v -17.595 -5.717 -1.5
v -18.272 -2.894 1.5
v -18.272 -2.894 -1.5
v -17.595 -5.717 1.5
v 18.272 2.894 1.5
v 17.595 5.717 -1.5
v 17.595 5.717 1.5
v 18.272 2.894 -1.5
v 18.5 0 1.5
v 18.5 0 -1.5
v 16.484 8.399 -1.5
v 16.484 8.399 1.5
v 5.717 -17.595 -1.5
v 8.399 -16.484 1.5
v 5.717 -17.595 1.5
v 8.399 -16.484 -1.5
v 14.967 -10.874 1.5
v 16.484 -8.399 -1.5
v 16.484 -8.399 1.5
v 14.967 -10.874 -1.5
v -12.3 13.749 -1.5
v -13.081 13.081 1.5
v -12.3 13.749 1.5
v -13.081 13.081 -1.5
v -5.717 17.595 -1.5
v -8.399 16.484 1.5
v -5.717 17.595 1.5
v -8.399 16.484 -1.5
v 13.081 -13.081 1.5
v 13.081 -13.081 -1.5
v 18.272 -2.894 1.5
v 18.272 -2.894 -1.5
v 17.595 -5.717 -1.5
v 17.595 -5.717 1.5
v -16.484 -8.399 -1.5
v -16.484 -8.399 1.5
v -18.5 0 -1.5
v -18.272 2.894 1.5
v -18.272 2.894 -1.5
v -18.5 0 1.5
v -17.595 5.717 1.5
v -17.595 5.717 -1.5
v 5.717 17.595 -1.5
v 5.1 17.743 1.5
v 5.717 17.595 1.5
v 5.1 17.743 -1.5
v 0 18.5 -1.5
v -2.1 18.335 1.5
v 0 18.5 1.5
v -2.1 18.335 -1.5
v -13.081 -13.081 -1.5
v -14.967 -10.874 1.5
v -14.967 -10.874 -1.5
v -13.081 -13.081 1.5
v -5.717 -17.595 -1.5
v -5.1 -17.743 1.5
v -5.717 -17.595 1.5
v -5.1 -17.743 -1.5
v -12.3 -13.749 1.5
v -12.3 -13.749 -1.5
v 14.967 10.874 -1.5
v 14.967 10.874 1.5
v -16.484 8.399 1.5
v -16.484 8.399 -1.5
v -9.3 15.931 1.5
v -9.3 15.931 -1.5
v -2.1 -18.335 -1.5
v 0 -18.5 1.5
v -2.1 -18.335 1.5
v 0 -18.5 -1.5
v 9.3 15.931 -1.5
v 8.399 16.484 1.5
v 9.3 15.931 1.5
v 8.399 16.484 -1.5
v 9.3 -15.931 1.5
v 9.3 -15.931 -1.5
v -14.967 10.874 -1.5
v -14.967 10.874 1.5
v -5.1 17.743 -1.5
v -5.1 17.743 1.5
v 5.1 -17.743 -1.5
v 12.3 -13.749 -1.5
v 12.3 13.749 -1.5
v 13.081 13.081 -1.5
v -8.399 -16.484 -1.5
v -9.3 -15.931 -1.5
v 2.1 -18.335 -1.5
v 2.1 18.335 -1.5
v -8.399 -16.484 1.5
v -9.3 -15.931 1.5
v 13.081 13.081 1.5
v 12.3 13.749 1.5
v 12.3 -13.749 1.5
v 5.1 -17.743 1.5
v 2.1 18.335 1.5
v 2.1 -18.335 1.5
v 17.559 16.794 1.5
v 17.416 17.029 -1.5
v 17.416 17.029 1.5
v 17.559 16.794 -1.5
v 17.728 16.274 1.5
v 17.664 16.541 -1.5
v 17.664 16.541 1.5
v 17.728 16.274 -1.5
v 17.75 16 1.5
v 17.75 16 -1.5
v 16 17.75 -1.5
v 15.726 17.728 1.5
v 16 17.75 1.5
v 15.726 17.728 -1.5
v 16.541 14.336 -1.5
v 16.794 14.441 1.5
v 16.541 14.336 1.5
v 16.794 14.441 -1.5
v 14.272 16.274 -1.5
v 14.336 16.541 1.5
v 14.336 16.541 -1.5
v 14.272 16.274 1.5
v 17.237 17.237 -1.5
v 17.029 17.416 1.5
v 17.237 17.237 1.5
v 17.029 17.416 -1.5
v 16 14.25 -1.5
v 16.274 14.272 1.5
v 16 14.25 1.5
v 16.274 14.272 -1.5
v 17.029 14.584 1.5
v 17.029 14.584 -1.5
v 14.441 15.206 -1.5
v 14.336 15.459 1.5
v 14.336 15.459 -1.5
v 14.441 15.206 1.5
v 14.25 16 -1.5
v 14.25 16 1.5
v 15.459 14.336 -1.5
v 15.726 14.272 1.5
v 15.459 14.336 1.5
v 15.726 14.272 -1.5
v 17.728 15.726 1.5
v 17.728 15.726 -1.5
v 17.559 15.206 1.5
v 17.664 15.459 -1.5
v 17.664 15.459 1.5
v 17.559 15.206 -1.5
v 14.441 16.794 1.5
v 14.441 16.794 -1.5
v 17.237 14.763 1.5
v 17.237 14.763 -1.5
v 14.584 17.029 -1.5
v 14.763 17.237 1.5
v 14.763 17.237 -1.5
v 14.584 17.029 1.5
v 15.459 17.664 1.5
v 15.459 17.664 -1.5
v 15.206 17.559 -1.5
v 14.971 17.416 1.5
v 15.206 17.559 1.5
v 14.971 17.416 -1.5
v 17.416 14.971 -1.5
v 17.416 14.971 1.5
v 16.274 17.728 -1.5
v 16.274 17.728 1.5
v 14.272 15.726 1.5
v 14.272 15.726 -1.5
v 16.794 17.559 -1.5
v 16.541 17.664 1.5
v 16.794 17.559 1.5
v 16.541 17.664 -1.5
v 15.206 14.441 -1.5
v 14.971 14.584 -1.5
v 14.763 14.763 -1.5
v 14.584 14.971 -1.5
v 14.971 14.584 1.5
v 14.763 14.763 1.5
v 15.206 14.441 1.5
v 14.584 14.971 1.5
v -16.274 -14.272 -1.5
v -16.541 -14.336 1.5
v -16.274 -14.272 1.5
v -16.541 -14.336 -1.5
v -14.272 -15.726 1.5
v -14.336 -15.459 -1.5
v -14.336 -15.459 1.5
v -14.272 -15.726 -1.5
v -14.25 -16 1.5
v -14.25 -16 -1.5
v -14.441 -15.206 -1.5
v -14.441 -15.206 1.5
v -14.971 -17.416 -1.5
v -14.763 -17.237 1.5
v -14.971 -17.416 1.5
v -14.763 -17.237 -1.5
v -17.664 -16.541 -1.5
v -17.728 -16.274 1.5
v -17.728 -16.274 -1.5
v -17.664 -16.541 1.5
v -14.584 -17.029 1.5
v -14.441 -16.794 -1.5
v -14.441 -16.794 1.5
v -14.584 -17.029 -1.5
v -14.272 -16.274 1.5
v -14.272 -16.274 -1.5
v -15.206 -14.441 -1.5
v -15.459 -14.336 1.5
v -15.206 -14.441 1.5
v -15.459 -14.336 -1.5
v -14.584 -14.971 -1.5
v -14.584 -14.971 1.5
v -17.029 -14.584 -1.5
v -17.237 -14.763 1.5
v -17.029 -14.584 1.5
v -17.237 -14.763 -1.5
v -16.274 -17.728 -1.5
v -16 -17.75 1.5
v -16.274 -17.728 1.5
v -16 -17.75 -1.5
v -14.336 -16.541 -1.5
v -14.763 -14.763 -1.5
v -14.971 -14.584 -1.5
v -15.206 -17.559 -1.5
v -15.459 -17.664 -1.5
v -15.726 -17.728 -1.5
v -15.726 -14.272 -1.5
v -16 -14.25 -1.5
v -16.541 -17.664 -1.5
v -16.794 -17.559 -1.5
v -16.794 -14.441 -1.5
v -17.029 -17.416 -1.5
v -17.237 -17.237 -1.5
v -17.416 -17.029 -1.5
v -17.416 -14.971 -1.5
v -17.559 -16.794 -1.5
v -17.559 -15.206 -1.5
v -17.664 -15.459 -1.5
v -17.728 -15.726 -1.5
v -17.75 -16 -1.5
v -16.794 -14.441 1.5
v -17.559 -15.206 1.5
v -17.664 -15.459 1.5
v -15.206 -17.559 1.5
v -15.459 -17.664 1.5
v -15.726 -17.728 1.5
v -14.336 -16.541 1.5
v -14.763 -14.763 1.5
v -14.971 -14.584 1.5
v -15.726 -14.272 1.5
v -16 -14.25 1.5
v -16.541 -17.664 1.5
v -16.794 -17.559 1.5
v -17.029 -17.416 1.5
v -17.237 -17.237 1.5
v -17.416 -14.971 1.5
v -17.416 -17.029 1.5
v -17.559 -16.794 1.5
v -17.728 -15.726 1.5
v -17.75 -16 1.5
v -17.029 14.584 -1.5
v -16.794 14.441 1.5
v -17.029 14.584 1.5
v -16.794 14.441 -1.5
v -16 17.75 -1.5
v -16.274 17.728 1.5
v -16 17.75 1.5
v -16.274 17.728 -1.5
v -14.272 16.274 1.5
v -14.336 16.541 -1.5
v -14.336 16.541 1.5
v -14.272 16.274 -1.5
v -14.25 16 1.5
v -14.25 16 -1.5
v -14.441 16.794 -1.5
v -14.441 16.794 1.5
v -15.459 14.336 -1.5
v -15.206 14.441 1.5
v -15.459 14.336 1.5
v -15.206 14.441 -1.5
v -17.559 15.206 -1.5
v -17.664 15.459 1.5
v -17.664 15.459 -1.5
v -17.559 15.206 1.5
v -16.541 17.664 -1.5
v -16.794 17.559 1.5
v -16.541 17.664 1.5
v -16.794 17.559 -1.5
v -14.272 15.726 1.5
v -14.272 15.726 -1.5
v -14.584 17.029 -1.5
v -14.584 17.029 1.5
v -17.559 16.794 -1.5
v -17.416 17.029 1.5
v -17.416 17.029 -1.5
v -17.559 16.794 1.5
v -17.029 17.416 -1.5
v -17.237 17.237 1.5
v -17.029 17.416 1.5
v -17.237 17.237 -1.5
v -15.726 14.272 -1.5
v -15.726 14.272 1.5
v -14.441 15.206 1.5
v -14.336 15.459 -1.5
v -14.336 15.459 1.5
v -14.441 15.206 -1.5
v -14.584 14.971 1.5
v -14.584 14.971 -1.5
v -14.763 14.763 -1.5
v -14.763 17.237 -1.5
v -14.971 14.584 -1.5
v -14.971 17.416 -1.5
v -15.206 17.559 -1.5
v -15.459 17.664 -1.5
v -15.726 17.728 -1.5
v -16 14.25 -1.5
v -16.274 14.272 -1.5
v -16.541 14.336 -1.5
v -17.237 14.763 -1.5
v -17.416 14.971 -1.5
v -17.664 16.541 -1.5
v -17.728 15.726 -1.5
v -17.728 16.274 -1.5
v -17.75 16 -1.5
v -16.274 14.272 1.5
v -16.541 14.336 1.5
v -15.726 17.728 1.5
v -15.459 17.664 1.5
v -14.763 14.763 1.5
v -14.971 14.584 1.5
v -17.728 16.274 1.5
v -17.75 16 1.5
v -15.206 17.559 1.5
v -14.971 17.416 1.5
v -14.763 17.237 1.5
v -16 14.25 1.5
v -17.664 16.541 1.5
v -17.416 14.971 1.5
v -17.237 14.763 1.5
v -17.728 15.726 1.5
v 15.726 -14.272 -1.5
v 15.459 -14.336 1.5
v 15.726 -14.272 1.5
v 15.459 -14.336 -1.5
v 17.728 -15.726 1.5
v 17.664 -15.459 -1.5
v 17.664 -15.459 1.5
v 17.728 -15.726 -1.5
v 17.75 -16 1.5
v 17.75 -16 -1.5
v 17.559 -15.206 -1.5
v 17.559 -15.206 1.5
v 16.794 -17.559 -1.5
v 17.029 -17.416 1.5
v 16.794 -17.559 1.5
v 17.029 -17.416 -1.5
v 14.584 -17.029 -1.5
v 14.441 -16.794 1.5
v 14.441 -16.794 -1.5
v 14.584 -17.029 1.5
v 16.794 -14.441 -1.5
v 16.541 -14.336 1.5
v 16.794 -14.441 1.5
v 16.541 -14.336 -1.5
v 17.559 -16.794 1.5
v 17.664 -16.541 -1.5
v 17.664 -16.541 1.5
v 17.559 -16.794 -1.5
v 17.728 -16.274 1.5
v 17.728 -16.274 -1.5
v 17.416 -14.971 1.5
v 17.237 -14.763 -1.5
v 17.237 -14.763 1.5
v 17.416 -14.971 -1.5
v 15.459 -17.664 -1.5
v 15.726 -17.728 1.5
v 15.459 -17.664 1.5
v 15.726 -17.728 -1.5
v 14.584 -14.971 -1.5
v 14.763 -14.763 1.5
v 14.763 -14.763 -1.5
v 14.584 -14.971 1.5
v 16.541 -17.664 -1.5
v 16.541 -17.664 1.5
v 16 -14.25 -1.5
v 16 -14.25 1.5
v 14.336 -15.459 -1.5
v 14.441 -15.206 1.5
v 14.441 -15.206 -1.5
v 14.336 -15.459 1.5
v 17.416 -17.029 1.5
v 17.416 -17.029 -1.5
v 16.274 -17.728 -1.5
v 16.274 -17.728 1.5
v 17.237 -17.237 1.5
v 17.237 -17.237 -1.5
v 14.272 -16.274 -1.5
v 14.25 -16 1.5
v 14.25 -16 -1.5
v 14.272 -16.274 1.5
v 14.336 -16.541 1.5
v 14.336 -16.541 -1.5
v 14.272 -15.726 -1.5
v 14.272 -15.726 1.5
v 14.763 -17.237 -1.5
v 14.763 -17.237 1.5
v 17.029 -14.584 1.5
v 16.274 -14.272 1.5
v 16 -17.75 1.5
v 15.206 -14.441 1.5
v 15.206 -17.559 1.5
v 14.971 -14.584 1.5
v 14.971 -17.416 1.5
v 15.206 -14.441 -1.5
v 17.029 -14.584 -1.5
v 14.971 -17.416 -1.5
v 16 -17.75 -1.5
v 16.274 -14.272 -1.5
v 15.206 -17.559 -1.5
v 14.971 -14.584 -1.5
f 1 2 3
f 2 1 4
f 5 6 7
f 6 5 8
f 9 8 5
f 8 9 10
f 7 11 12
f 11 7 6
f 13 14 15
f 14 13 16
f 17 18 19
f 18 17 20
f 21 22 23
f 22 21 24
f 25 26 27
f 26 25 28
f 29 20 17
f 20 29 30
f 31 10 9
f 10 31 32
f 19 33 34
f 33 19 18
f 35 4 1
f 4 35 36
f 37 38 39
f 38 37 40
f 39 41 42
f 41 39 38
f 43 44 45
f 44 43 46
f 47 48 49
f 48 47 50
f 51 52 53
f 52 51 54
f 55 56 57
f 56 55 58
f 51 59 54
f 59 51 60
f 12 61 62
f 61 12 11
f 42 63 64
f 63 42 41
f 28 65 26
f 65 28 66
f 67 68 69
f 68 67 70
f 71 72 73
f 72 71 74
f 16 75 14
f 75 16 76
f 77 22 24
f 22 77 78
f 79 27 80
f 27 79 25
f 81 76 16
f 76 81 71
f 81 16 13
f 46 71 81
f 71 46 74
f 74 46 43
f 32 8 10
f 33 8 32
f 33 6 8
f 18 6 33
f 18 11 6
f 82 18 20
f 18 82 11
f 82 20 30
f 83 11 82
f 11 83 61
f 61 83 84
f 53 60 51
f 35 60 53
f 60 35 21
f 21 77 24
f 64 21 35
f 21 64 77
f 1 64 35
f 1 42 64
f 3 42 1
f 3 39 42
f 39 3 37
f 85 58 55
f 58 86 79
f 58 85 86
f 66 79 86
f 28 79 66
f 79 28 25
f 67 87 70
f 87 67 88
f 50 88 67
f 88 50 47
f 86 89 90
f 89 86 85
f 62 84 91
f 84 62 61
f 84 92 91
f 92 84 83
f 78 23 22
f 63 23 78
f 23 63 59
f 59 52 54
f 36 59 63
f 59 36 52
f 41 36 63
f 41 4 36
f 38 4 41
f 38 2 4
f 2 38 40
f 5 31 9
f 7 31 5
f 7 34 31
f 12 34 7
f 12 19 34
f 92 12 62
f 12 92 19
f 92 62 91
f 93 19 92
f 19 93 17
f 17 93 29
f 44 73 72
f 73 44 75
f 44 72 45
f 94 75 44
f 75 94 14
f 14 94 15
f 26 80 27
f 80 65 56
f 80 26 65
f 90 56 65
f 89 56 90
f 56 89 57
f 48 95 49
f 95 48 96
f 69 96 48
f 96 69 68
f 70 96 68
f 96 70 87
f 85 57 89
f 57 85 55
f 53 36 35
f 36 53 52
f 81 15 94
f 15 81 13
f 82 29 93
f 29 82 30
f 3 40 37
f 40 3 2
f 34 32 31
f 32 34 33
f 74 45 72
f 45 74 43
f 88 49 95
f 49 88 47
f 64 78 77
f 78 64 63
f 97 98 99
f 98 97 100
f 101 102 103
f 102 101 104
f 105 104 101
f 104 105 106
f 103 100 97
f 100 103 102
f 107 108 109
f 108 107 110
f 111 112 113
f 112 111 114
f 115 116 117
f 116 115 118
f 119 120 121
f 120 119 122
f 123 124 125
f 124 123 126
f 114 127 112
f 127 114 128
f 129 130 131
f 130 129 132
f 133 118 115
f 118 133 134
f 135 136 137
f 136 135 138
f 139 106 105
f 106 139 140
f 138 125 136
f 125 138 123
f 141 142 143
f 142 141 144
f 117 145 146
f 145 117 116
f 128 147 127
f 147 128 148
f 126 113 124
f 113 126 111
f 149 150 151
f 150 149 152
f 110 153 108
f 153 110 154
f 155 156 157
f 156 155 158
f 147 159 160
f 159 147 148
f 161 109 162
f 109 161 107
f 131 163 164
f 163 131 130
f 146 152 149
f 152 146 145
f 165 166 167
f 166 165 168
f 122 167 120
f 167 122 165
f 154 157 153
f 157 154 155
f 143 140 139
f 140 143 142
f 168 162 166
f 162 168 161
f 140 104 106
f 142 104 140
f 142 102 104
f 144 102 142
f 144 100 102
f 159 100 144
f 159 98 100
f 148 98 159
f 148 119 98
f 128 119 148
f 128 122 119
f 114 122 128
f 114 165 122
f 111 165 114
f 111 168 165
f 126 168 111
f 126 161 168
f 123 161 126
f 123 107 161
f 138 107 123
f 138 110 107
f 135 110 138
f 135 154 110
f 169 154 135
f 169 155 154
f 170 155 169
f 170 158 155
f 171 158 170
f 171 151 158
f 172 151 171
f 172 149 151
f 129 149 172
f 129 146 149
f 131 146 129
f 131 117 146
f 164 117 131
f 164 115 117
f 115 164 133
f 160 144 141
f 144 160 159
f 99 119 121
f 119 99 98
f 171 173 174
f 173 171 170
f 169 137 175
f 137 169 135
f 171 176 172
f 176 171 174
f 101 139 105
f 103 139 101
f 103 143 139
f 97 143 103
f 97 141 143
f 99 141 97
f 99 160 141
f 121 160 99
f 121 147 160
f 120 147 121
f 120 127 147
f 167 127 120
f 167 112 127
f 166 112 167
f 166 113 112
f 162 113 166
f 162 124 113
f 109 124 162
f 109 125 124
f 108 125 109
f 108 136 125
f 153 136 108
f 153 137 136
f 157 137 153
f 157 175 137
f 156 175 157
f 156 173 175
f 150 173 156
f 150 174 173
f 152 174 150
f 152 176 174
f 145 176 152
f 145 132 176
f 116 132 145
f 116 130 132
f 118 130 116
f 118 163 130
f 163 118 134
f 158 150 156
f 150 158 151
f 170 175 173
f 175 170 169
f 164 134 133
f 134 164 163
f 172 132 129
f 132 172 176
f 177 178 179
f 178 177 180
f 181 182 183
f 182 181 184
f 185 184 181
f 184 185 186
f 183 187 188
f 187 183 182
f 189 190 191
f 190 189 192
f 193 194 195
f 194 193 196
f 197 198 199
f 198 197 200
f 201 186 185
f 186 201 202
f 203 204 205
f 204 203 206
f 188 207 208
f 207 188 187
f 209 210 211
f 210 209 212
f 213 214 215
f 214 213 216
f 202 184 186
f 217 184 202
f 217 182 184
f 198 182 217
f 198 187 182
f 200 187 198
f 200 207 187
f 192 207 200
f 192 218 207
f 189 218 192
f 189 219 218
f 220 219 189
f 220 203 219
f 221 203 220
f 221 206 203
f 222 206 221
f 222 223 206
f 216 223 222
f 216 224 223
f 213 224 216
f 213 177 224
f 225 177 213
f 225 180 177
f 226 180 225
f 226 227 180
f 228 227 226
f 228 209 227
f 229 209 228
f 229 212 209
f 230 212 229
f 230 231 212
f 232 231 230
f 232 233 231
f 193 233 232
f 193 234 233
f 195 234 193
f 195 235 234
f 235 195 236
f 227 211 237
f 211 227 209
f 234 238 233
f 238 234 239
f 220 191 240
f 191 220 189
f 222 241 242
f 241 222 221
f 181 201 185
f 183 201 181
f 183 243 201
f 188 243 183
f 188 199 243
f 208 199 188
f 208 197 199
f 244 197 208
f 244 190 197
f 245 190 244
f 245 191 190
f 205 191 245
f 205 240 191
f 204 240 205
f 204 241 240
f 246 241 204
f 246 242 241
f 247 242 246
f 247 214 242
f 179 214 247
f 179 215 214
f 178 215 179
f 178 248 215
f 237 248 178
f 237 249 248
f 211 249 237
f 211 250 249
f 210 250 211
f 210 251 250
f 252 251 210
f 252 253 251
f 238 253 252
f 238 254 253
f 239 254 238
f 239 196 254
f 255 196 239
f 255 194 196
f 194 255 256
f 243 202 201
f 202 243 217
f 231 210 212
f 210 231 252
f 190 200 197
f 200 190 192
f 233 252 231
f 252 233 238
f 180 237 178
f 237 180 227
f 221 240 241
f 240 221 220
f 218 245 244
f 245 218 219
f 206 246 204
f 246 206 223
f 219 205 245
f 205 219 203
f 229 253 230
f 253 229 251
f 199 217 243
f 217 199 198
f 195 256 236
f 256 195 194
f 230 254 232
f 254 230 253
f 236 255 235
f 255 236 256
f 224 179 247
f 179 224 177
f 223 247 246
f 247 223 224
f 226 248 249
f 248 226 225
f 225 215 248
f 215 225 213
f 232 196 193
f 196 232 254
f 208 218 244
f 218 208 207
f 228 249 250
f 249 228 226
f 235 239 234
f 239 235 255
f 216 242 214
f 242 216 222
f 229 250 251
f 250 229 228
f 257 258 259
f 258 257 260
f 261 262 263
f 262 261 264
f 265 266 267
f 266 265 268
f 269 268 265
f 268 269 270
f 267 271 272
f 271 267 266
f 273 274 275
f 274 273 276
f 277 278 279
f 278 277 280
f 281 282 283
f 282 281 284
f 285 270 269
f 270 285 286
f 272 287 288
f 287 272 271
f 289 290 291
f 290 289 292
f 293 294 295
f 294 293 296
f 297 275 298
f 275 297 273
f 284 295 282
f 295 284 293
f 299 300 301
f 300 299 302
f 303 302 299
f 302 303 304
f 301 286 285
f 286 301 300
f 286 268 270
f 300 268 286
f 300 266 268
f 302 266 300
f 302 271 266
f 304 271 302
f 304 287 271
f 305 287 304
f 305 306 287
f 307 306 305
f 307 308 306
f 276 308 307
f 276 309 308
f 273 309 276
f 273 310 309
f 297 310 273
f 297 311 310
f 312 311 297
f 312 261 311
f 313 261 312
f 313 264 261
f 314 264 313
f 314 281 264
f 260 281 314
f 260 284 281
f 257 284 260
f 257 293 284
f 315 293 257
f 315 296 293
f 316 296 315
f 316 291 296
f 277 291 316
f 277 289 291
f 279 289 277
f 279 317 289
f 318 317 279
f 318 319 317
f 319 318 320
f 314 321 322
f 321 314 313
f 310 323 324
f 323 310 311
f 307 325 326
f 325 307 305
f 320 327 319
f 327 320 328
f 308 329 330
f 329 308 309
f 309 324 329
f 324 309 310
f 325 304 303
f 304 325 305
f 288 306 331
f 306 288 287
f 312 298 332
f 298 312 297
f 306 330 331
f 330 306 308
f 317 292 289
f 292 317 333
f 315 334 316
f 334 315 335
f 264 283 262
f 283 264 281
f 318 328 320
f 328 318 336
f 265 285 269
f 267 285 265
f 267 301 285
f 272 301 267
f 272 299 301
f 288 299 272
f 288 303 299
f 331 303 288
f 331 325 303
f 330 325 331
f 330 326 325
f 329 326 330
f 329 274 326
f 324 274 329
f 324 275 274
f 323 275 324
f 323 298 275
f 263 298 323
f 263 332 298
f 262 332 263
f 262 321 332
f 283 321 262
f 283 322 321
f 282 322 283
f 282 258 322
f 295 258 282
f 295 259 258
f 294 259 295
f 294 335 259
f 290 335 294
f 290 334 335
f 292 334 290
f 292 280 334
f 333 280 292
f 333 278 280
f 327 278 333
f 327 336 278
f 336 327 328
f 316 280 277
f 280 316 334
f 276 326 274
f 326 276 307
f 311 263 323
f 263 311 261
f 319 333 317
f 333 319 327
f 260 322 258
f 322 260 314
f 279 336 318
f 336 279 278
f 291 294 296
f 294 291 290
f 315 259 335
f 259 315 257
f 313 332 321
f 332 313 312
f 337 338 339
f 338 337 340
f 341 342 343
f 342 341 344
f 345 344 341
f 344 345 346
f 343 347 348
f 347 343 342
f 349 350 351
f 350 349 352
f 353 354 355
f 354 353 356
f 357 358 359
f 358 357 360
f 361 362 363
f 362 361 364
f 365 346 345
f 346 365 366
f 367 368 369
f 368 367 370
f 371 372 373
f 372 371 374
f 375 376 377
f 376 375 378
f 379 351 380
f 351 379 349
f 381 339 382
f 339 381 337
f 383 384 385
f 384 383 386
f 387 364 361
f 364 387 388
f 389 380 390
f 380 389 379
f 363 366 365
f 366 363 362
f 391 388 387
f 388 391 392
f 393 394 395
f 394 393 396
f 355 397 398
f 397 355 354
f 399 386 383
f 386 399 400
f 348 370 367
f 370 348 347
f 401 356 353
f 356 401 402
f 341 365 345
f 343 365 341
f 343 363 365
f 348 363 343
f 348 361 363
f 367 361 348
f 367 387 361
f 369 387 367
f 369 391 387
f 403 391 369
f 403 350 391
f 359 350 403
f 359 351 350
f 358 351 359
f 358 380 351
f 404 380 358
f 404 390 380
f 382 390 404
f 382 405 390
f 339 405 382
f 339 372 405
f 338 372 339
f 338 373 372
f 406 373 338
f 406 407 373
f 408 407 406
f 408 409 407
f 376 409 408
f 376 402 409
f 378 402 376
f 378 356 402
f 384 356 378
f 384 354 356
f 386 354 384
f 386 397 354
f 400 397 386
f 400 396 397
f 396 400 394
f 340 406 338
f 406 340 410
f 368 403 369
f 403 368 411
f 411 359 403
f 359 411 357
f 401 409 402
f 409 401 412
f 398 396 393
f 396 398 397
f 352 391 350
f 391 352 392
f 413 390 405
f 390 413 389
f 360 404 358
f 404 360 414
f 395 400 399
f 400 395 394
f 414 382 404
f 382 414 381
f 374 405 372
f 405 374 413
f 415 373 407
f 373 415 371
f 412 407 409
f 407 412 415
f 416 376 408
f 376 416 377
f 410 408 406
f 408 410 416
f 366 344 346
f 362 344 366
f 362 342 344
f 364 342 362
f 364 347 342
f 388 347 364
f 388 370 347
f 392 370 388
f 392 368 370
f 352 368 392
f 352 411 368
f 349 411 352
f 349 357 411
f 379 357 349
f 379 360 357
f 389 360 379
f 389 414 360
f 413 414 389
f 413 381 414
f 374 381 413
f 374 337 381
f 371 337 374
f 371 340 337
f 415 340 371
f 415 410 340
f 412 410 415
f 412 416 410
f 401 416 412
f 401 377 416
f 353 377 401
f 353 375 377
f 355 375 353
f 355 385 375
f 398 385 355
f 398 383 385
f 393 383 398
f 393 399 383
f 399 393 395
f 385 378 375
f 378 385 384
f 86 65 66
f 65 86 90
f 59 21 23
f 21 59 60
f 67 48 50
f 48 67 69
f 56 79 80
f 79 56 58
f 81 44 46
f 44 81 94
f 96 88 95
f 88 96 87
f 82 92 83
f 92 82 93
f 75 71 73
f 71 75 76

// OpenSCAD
//import("ramps-enclosure.STL");

module p_fan40_cuts(height=3) {
  $fn=40;  
  cylinder(d=37, h=height, center=true);  
  translate([16,16,0]) cylinder(d=3.5, h=height, center=true);
  translate([-16,-16,,0]) cylinder(d=3.5, h=height, center=true);
  translate([-16,16,0]) cylinder(d=3.5, h=height, center=true);
  translate([16,-16,0]) cylinder(d=3.5, h=height, center=true);
}

module grill40(height=3) {
  
  for(i=[1:4]) {
    translate([i*7.2-18,0,0]) cube([3,40,height+0.1], center=true);    
  }
}

module fan40_cuts(height=20) {
  difference() {
    p_fan40_cuts();  
    grill40();
  }
}


fan40_cuts(height=20);      
